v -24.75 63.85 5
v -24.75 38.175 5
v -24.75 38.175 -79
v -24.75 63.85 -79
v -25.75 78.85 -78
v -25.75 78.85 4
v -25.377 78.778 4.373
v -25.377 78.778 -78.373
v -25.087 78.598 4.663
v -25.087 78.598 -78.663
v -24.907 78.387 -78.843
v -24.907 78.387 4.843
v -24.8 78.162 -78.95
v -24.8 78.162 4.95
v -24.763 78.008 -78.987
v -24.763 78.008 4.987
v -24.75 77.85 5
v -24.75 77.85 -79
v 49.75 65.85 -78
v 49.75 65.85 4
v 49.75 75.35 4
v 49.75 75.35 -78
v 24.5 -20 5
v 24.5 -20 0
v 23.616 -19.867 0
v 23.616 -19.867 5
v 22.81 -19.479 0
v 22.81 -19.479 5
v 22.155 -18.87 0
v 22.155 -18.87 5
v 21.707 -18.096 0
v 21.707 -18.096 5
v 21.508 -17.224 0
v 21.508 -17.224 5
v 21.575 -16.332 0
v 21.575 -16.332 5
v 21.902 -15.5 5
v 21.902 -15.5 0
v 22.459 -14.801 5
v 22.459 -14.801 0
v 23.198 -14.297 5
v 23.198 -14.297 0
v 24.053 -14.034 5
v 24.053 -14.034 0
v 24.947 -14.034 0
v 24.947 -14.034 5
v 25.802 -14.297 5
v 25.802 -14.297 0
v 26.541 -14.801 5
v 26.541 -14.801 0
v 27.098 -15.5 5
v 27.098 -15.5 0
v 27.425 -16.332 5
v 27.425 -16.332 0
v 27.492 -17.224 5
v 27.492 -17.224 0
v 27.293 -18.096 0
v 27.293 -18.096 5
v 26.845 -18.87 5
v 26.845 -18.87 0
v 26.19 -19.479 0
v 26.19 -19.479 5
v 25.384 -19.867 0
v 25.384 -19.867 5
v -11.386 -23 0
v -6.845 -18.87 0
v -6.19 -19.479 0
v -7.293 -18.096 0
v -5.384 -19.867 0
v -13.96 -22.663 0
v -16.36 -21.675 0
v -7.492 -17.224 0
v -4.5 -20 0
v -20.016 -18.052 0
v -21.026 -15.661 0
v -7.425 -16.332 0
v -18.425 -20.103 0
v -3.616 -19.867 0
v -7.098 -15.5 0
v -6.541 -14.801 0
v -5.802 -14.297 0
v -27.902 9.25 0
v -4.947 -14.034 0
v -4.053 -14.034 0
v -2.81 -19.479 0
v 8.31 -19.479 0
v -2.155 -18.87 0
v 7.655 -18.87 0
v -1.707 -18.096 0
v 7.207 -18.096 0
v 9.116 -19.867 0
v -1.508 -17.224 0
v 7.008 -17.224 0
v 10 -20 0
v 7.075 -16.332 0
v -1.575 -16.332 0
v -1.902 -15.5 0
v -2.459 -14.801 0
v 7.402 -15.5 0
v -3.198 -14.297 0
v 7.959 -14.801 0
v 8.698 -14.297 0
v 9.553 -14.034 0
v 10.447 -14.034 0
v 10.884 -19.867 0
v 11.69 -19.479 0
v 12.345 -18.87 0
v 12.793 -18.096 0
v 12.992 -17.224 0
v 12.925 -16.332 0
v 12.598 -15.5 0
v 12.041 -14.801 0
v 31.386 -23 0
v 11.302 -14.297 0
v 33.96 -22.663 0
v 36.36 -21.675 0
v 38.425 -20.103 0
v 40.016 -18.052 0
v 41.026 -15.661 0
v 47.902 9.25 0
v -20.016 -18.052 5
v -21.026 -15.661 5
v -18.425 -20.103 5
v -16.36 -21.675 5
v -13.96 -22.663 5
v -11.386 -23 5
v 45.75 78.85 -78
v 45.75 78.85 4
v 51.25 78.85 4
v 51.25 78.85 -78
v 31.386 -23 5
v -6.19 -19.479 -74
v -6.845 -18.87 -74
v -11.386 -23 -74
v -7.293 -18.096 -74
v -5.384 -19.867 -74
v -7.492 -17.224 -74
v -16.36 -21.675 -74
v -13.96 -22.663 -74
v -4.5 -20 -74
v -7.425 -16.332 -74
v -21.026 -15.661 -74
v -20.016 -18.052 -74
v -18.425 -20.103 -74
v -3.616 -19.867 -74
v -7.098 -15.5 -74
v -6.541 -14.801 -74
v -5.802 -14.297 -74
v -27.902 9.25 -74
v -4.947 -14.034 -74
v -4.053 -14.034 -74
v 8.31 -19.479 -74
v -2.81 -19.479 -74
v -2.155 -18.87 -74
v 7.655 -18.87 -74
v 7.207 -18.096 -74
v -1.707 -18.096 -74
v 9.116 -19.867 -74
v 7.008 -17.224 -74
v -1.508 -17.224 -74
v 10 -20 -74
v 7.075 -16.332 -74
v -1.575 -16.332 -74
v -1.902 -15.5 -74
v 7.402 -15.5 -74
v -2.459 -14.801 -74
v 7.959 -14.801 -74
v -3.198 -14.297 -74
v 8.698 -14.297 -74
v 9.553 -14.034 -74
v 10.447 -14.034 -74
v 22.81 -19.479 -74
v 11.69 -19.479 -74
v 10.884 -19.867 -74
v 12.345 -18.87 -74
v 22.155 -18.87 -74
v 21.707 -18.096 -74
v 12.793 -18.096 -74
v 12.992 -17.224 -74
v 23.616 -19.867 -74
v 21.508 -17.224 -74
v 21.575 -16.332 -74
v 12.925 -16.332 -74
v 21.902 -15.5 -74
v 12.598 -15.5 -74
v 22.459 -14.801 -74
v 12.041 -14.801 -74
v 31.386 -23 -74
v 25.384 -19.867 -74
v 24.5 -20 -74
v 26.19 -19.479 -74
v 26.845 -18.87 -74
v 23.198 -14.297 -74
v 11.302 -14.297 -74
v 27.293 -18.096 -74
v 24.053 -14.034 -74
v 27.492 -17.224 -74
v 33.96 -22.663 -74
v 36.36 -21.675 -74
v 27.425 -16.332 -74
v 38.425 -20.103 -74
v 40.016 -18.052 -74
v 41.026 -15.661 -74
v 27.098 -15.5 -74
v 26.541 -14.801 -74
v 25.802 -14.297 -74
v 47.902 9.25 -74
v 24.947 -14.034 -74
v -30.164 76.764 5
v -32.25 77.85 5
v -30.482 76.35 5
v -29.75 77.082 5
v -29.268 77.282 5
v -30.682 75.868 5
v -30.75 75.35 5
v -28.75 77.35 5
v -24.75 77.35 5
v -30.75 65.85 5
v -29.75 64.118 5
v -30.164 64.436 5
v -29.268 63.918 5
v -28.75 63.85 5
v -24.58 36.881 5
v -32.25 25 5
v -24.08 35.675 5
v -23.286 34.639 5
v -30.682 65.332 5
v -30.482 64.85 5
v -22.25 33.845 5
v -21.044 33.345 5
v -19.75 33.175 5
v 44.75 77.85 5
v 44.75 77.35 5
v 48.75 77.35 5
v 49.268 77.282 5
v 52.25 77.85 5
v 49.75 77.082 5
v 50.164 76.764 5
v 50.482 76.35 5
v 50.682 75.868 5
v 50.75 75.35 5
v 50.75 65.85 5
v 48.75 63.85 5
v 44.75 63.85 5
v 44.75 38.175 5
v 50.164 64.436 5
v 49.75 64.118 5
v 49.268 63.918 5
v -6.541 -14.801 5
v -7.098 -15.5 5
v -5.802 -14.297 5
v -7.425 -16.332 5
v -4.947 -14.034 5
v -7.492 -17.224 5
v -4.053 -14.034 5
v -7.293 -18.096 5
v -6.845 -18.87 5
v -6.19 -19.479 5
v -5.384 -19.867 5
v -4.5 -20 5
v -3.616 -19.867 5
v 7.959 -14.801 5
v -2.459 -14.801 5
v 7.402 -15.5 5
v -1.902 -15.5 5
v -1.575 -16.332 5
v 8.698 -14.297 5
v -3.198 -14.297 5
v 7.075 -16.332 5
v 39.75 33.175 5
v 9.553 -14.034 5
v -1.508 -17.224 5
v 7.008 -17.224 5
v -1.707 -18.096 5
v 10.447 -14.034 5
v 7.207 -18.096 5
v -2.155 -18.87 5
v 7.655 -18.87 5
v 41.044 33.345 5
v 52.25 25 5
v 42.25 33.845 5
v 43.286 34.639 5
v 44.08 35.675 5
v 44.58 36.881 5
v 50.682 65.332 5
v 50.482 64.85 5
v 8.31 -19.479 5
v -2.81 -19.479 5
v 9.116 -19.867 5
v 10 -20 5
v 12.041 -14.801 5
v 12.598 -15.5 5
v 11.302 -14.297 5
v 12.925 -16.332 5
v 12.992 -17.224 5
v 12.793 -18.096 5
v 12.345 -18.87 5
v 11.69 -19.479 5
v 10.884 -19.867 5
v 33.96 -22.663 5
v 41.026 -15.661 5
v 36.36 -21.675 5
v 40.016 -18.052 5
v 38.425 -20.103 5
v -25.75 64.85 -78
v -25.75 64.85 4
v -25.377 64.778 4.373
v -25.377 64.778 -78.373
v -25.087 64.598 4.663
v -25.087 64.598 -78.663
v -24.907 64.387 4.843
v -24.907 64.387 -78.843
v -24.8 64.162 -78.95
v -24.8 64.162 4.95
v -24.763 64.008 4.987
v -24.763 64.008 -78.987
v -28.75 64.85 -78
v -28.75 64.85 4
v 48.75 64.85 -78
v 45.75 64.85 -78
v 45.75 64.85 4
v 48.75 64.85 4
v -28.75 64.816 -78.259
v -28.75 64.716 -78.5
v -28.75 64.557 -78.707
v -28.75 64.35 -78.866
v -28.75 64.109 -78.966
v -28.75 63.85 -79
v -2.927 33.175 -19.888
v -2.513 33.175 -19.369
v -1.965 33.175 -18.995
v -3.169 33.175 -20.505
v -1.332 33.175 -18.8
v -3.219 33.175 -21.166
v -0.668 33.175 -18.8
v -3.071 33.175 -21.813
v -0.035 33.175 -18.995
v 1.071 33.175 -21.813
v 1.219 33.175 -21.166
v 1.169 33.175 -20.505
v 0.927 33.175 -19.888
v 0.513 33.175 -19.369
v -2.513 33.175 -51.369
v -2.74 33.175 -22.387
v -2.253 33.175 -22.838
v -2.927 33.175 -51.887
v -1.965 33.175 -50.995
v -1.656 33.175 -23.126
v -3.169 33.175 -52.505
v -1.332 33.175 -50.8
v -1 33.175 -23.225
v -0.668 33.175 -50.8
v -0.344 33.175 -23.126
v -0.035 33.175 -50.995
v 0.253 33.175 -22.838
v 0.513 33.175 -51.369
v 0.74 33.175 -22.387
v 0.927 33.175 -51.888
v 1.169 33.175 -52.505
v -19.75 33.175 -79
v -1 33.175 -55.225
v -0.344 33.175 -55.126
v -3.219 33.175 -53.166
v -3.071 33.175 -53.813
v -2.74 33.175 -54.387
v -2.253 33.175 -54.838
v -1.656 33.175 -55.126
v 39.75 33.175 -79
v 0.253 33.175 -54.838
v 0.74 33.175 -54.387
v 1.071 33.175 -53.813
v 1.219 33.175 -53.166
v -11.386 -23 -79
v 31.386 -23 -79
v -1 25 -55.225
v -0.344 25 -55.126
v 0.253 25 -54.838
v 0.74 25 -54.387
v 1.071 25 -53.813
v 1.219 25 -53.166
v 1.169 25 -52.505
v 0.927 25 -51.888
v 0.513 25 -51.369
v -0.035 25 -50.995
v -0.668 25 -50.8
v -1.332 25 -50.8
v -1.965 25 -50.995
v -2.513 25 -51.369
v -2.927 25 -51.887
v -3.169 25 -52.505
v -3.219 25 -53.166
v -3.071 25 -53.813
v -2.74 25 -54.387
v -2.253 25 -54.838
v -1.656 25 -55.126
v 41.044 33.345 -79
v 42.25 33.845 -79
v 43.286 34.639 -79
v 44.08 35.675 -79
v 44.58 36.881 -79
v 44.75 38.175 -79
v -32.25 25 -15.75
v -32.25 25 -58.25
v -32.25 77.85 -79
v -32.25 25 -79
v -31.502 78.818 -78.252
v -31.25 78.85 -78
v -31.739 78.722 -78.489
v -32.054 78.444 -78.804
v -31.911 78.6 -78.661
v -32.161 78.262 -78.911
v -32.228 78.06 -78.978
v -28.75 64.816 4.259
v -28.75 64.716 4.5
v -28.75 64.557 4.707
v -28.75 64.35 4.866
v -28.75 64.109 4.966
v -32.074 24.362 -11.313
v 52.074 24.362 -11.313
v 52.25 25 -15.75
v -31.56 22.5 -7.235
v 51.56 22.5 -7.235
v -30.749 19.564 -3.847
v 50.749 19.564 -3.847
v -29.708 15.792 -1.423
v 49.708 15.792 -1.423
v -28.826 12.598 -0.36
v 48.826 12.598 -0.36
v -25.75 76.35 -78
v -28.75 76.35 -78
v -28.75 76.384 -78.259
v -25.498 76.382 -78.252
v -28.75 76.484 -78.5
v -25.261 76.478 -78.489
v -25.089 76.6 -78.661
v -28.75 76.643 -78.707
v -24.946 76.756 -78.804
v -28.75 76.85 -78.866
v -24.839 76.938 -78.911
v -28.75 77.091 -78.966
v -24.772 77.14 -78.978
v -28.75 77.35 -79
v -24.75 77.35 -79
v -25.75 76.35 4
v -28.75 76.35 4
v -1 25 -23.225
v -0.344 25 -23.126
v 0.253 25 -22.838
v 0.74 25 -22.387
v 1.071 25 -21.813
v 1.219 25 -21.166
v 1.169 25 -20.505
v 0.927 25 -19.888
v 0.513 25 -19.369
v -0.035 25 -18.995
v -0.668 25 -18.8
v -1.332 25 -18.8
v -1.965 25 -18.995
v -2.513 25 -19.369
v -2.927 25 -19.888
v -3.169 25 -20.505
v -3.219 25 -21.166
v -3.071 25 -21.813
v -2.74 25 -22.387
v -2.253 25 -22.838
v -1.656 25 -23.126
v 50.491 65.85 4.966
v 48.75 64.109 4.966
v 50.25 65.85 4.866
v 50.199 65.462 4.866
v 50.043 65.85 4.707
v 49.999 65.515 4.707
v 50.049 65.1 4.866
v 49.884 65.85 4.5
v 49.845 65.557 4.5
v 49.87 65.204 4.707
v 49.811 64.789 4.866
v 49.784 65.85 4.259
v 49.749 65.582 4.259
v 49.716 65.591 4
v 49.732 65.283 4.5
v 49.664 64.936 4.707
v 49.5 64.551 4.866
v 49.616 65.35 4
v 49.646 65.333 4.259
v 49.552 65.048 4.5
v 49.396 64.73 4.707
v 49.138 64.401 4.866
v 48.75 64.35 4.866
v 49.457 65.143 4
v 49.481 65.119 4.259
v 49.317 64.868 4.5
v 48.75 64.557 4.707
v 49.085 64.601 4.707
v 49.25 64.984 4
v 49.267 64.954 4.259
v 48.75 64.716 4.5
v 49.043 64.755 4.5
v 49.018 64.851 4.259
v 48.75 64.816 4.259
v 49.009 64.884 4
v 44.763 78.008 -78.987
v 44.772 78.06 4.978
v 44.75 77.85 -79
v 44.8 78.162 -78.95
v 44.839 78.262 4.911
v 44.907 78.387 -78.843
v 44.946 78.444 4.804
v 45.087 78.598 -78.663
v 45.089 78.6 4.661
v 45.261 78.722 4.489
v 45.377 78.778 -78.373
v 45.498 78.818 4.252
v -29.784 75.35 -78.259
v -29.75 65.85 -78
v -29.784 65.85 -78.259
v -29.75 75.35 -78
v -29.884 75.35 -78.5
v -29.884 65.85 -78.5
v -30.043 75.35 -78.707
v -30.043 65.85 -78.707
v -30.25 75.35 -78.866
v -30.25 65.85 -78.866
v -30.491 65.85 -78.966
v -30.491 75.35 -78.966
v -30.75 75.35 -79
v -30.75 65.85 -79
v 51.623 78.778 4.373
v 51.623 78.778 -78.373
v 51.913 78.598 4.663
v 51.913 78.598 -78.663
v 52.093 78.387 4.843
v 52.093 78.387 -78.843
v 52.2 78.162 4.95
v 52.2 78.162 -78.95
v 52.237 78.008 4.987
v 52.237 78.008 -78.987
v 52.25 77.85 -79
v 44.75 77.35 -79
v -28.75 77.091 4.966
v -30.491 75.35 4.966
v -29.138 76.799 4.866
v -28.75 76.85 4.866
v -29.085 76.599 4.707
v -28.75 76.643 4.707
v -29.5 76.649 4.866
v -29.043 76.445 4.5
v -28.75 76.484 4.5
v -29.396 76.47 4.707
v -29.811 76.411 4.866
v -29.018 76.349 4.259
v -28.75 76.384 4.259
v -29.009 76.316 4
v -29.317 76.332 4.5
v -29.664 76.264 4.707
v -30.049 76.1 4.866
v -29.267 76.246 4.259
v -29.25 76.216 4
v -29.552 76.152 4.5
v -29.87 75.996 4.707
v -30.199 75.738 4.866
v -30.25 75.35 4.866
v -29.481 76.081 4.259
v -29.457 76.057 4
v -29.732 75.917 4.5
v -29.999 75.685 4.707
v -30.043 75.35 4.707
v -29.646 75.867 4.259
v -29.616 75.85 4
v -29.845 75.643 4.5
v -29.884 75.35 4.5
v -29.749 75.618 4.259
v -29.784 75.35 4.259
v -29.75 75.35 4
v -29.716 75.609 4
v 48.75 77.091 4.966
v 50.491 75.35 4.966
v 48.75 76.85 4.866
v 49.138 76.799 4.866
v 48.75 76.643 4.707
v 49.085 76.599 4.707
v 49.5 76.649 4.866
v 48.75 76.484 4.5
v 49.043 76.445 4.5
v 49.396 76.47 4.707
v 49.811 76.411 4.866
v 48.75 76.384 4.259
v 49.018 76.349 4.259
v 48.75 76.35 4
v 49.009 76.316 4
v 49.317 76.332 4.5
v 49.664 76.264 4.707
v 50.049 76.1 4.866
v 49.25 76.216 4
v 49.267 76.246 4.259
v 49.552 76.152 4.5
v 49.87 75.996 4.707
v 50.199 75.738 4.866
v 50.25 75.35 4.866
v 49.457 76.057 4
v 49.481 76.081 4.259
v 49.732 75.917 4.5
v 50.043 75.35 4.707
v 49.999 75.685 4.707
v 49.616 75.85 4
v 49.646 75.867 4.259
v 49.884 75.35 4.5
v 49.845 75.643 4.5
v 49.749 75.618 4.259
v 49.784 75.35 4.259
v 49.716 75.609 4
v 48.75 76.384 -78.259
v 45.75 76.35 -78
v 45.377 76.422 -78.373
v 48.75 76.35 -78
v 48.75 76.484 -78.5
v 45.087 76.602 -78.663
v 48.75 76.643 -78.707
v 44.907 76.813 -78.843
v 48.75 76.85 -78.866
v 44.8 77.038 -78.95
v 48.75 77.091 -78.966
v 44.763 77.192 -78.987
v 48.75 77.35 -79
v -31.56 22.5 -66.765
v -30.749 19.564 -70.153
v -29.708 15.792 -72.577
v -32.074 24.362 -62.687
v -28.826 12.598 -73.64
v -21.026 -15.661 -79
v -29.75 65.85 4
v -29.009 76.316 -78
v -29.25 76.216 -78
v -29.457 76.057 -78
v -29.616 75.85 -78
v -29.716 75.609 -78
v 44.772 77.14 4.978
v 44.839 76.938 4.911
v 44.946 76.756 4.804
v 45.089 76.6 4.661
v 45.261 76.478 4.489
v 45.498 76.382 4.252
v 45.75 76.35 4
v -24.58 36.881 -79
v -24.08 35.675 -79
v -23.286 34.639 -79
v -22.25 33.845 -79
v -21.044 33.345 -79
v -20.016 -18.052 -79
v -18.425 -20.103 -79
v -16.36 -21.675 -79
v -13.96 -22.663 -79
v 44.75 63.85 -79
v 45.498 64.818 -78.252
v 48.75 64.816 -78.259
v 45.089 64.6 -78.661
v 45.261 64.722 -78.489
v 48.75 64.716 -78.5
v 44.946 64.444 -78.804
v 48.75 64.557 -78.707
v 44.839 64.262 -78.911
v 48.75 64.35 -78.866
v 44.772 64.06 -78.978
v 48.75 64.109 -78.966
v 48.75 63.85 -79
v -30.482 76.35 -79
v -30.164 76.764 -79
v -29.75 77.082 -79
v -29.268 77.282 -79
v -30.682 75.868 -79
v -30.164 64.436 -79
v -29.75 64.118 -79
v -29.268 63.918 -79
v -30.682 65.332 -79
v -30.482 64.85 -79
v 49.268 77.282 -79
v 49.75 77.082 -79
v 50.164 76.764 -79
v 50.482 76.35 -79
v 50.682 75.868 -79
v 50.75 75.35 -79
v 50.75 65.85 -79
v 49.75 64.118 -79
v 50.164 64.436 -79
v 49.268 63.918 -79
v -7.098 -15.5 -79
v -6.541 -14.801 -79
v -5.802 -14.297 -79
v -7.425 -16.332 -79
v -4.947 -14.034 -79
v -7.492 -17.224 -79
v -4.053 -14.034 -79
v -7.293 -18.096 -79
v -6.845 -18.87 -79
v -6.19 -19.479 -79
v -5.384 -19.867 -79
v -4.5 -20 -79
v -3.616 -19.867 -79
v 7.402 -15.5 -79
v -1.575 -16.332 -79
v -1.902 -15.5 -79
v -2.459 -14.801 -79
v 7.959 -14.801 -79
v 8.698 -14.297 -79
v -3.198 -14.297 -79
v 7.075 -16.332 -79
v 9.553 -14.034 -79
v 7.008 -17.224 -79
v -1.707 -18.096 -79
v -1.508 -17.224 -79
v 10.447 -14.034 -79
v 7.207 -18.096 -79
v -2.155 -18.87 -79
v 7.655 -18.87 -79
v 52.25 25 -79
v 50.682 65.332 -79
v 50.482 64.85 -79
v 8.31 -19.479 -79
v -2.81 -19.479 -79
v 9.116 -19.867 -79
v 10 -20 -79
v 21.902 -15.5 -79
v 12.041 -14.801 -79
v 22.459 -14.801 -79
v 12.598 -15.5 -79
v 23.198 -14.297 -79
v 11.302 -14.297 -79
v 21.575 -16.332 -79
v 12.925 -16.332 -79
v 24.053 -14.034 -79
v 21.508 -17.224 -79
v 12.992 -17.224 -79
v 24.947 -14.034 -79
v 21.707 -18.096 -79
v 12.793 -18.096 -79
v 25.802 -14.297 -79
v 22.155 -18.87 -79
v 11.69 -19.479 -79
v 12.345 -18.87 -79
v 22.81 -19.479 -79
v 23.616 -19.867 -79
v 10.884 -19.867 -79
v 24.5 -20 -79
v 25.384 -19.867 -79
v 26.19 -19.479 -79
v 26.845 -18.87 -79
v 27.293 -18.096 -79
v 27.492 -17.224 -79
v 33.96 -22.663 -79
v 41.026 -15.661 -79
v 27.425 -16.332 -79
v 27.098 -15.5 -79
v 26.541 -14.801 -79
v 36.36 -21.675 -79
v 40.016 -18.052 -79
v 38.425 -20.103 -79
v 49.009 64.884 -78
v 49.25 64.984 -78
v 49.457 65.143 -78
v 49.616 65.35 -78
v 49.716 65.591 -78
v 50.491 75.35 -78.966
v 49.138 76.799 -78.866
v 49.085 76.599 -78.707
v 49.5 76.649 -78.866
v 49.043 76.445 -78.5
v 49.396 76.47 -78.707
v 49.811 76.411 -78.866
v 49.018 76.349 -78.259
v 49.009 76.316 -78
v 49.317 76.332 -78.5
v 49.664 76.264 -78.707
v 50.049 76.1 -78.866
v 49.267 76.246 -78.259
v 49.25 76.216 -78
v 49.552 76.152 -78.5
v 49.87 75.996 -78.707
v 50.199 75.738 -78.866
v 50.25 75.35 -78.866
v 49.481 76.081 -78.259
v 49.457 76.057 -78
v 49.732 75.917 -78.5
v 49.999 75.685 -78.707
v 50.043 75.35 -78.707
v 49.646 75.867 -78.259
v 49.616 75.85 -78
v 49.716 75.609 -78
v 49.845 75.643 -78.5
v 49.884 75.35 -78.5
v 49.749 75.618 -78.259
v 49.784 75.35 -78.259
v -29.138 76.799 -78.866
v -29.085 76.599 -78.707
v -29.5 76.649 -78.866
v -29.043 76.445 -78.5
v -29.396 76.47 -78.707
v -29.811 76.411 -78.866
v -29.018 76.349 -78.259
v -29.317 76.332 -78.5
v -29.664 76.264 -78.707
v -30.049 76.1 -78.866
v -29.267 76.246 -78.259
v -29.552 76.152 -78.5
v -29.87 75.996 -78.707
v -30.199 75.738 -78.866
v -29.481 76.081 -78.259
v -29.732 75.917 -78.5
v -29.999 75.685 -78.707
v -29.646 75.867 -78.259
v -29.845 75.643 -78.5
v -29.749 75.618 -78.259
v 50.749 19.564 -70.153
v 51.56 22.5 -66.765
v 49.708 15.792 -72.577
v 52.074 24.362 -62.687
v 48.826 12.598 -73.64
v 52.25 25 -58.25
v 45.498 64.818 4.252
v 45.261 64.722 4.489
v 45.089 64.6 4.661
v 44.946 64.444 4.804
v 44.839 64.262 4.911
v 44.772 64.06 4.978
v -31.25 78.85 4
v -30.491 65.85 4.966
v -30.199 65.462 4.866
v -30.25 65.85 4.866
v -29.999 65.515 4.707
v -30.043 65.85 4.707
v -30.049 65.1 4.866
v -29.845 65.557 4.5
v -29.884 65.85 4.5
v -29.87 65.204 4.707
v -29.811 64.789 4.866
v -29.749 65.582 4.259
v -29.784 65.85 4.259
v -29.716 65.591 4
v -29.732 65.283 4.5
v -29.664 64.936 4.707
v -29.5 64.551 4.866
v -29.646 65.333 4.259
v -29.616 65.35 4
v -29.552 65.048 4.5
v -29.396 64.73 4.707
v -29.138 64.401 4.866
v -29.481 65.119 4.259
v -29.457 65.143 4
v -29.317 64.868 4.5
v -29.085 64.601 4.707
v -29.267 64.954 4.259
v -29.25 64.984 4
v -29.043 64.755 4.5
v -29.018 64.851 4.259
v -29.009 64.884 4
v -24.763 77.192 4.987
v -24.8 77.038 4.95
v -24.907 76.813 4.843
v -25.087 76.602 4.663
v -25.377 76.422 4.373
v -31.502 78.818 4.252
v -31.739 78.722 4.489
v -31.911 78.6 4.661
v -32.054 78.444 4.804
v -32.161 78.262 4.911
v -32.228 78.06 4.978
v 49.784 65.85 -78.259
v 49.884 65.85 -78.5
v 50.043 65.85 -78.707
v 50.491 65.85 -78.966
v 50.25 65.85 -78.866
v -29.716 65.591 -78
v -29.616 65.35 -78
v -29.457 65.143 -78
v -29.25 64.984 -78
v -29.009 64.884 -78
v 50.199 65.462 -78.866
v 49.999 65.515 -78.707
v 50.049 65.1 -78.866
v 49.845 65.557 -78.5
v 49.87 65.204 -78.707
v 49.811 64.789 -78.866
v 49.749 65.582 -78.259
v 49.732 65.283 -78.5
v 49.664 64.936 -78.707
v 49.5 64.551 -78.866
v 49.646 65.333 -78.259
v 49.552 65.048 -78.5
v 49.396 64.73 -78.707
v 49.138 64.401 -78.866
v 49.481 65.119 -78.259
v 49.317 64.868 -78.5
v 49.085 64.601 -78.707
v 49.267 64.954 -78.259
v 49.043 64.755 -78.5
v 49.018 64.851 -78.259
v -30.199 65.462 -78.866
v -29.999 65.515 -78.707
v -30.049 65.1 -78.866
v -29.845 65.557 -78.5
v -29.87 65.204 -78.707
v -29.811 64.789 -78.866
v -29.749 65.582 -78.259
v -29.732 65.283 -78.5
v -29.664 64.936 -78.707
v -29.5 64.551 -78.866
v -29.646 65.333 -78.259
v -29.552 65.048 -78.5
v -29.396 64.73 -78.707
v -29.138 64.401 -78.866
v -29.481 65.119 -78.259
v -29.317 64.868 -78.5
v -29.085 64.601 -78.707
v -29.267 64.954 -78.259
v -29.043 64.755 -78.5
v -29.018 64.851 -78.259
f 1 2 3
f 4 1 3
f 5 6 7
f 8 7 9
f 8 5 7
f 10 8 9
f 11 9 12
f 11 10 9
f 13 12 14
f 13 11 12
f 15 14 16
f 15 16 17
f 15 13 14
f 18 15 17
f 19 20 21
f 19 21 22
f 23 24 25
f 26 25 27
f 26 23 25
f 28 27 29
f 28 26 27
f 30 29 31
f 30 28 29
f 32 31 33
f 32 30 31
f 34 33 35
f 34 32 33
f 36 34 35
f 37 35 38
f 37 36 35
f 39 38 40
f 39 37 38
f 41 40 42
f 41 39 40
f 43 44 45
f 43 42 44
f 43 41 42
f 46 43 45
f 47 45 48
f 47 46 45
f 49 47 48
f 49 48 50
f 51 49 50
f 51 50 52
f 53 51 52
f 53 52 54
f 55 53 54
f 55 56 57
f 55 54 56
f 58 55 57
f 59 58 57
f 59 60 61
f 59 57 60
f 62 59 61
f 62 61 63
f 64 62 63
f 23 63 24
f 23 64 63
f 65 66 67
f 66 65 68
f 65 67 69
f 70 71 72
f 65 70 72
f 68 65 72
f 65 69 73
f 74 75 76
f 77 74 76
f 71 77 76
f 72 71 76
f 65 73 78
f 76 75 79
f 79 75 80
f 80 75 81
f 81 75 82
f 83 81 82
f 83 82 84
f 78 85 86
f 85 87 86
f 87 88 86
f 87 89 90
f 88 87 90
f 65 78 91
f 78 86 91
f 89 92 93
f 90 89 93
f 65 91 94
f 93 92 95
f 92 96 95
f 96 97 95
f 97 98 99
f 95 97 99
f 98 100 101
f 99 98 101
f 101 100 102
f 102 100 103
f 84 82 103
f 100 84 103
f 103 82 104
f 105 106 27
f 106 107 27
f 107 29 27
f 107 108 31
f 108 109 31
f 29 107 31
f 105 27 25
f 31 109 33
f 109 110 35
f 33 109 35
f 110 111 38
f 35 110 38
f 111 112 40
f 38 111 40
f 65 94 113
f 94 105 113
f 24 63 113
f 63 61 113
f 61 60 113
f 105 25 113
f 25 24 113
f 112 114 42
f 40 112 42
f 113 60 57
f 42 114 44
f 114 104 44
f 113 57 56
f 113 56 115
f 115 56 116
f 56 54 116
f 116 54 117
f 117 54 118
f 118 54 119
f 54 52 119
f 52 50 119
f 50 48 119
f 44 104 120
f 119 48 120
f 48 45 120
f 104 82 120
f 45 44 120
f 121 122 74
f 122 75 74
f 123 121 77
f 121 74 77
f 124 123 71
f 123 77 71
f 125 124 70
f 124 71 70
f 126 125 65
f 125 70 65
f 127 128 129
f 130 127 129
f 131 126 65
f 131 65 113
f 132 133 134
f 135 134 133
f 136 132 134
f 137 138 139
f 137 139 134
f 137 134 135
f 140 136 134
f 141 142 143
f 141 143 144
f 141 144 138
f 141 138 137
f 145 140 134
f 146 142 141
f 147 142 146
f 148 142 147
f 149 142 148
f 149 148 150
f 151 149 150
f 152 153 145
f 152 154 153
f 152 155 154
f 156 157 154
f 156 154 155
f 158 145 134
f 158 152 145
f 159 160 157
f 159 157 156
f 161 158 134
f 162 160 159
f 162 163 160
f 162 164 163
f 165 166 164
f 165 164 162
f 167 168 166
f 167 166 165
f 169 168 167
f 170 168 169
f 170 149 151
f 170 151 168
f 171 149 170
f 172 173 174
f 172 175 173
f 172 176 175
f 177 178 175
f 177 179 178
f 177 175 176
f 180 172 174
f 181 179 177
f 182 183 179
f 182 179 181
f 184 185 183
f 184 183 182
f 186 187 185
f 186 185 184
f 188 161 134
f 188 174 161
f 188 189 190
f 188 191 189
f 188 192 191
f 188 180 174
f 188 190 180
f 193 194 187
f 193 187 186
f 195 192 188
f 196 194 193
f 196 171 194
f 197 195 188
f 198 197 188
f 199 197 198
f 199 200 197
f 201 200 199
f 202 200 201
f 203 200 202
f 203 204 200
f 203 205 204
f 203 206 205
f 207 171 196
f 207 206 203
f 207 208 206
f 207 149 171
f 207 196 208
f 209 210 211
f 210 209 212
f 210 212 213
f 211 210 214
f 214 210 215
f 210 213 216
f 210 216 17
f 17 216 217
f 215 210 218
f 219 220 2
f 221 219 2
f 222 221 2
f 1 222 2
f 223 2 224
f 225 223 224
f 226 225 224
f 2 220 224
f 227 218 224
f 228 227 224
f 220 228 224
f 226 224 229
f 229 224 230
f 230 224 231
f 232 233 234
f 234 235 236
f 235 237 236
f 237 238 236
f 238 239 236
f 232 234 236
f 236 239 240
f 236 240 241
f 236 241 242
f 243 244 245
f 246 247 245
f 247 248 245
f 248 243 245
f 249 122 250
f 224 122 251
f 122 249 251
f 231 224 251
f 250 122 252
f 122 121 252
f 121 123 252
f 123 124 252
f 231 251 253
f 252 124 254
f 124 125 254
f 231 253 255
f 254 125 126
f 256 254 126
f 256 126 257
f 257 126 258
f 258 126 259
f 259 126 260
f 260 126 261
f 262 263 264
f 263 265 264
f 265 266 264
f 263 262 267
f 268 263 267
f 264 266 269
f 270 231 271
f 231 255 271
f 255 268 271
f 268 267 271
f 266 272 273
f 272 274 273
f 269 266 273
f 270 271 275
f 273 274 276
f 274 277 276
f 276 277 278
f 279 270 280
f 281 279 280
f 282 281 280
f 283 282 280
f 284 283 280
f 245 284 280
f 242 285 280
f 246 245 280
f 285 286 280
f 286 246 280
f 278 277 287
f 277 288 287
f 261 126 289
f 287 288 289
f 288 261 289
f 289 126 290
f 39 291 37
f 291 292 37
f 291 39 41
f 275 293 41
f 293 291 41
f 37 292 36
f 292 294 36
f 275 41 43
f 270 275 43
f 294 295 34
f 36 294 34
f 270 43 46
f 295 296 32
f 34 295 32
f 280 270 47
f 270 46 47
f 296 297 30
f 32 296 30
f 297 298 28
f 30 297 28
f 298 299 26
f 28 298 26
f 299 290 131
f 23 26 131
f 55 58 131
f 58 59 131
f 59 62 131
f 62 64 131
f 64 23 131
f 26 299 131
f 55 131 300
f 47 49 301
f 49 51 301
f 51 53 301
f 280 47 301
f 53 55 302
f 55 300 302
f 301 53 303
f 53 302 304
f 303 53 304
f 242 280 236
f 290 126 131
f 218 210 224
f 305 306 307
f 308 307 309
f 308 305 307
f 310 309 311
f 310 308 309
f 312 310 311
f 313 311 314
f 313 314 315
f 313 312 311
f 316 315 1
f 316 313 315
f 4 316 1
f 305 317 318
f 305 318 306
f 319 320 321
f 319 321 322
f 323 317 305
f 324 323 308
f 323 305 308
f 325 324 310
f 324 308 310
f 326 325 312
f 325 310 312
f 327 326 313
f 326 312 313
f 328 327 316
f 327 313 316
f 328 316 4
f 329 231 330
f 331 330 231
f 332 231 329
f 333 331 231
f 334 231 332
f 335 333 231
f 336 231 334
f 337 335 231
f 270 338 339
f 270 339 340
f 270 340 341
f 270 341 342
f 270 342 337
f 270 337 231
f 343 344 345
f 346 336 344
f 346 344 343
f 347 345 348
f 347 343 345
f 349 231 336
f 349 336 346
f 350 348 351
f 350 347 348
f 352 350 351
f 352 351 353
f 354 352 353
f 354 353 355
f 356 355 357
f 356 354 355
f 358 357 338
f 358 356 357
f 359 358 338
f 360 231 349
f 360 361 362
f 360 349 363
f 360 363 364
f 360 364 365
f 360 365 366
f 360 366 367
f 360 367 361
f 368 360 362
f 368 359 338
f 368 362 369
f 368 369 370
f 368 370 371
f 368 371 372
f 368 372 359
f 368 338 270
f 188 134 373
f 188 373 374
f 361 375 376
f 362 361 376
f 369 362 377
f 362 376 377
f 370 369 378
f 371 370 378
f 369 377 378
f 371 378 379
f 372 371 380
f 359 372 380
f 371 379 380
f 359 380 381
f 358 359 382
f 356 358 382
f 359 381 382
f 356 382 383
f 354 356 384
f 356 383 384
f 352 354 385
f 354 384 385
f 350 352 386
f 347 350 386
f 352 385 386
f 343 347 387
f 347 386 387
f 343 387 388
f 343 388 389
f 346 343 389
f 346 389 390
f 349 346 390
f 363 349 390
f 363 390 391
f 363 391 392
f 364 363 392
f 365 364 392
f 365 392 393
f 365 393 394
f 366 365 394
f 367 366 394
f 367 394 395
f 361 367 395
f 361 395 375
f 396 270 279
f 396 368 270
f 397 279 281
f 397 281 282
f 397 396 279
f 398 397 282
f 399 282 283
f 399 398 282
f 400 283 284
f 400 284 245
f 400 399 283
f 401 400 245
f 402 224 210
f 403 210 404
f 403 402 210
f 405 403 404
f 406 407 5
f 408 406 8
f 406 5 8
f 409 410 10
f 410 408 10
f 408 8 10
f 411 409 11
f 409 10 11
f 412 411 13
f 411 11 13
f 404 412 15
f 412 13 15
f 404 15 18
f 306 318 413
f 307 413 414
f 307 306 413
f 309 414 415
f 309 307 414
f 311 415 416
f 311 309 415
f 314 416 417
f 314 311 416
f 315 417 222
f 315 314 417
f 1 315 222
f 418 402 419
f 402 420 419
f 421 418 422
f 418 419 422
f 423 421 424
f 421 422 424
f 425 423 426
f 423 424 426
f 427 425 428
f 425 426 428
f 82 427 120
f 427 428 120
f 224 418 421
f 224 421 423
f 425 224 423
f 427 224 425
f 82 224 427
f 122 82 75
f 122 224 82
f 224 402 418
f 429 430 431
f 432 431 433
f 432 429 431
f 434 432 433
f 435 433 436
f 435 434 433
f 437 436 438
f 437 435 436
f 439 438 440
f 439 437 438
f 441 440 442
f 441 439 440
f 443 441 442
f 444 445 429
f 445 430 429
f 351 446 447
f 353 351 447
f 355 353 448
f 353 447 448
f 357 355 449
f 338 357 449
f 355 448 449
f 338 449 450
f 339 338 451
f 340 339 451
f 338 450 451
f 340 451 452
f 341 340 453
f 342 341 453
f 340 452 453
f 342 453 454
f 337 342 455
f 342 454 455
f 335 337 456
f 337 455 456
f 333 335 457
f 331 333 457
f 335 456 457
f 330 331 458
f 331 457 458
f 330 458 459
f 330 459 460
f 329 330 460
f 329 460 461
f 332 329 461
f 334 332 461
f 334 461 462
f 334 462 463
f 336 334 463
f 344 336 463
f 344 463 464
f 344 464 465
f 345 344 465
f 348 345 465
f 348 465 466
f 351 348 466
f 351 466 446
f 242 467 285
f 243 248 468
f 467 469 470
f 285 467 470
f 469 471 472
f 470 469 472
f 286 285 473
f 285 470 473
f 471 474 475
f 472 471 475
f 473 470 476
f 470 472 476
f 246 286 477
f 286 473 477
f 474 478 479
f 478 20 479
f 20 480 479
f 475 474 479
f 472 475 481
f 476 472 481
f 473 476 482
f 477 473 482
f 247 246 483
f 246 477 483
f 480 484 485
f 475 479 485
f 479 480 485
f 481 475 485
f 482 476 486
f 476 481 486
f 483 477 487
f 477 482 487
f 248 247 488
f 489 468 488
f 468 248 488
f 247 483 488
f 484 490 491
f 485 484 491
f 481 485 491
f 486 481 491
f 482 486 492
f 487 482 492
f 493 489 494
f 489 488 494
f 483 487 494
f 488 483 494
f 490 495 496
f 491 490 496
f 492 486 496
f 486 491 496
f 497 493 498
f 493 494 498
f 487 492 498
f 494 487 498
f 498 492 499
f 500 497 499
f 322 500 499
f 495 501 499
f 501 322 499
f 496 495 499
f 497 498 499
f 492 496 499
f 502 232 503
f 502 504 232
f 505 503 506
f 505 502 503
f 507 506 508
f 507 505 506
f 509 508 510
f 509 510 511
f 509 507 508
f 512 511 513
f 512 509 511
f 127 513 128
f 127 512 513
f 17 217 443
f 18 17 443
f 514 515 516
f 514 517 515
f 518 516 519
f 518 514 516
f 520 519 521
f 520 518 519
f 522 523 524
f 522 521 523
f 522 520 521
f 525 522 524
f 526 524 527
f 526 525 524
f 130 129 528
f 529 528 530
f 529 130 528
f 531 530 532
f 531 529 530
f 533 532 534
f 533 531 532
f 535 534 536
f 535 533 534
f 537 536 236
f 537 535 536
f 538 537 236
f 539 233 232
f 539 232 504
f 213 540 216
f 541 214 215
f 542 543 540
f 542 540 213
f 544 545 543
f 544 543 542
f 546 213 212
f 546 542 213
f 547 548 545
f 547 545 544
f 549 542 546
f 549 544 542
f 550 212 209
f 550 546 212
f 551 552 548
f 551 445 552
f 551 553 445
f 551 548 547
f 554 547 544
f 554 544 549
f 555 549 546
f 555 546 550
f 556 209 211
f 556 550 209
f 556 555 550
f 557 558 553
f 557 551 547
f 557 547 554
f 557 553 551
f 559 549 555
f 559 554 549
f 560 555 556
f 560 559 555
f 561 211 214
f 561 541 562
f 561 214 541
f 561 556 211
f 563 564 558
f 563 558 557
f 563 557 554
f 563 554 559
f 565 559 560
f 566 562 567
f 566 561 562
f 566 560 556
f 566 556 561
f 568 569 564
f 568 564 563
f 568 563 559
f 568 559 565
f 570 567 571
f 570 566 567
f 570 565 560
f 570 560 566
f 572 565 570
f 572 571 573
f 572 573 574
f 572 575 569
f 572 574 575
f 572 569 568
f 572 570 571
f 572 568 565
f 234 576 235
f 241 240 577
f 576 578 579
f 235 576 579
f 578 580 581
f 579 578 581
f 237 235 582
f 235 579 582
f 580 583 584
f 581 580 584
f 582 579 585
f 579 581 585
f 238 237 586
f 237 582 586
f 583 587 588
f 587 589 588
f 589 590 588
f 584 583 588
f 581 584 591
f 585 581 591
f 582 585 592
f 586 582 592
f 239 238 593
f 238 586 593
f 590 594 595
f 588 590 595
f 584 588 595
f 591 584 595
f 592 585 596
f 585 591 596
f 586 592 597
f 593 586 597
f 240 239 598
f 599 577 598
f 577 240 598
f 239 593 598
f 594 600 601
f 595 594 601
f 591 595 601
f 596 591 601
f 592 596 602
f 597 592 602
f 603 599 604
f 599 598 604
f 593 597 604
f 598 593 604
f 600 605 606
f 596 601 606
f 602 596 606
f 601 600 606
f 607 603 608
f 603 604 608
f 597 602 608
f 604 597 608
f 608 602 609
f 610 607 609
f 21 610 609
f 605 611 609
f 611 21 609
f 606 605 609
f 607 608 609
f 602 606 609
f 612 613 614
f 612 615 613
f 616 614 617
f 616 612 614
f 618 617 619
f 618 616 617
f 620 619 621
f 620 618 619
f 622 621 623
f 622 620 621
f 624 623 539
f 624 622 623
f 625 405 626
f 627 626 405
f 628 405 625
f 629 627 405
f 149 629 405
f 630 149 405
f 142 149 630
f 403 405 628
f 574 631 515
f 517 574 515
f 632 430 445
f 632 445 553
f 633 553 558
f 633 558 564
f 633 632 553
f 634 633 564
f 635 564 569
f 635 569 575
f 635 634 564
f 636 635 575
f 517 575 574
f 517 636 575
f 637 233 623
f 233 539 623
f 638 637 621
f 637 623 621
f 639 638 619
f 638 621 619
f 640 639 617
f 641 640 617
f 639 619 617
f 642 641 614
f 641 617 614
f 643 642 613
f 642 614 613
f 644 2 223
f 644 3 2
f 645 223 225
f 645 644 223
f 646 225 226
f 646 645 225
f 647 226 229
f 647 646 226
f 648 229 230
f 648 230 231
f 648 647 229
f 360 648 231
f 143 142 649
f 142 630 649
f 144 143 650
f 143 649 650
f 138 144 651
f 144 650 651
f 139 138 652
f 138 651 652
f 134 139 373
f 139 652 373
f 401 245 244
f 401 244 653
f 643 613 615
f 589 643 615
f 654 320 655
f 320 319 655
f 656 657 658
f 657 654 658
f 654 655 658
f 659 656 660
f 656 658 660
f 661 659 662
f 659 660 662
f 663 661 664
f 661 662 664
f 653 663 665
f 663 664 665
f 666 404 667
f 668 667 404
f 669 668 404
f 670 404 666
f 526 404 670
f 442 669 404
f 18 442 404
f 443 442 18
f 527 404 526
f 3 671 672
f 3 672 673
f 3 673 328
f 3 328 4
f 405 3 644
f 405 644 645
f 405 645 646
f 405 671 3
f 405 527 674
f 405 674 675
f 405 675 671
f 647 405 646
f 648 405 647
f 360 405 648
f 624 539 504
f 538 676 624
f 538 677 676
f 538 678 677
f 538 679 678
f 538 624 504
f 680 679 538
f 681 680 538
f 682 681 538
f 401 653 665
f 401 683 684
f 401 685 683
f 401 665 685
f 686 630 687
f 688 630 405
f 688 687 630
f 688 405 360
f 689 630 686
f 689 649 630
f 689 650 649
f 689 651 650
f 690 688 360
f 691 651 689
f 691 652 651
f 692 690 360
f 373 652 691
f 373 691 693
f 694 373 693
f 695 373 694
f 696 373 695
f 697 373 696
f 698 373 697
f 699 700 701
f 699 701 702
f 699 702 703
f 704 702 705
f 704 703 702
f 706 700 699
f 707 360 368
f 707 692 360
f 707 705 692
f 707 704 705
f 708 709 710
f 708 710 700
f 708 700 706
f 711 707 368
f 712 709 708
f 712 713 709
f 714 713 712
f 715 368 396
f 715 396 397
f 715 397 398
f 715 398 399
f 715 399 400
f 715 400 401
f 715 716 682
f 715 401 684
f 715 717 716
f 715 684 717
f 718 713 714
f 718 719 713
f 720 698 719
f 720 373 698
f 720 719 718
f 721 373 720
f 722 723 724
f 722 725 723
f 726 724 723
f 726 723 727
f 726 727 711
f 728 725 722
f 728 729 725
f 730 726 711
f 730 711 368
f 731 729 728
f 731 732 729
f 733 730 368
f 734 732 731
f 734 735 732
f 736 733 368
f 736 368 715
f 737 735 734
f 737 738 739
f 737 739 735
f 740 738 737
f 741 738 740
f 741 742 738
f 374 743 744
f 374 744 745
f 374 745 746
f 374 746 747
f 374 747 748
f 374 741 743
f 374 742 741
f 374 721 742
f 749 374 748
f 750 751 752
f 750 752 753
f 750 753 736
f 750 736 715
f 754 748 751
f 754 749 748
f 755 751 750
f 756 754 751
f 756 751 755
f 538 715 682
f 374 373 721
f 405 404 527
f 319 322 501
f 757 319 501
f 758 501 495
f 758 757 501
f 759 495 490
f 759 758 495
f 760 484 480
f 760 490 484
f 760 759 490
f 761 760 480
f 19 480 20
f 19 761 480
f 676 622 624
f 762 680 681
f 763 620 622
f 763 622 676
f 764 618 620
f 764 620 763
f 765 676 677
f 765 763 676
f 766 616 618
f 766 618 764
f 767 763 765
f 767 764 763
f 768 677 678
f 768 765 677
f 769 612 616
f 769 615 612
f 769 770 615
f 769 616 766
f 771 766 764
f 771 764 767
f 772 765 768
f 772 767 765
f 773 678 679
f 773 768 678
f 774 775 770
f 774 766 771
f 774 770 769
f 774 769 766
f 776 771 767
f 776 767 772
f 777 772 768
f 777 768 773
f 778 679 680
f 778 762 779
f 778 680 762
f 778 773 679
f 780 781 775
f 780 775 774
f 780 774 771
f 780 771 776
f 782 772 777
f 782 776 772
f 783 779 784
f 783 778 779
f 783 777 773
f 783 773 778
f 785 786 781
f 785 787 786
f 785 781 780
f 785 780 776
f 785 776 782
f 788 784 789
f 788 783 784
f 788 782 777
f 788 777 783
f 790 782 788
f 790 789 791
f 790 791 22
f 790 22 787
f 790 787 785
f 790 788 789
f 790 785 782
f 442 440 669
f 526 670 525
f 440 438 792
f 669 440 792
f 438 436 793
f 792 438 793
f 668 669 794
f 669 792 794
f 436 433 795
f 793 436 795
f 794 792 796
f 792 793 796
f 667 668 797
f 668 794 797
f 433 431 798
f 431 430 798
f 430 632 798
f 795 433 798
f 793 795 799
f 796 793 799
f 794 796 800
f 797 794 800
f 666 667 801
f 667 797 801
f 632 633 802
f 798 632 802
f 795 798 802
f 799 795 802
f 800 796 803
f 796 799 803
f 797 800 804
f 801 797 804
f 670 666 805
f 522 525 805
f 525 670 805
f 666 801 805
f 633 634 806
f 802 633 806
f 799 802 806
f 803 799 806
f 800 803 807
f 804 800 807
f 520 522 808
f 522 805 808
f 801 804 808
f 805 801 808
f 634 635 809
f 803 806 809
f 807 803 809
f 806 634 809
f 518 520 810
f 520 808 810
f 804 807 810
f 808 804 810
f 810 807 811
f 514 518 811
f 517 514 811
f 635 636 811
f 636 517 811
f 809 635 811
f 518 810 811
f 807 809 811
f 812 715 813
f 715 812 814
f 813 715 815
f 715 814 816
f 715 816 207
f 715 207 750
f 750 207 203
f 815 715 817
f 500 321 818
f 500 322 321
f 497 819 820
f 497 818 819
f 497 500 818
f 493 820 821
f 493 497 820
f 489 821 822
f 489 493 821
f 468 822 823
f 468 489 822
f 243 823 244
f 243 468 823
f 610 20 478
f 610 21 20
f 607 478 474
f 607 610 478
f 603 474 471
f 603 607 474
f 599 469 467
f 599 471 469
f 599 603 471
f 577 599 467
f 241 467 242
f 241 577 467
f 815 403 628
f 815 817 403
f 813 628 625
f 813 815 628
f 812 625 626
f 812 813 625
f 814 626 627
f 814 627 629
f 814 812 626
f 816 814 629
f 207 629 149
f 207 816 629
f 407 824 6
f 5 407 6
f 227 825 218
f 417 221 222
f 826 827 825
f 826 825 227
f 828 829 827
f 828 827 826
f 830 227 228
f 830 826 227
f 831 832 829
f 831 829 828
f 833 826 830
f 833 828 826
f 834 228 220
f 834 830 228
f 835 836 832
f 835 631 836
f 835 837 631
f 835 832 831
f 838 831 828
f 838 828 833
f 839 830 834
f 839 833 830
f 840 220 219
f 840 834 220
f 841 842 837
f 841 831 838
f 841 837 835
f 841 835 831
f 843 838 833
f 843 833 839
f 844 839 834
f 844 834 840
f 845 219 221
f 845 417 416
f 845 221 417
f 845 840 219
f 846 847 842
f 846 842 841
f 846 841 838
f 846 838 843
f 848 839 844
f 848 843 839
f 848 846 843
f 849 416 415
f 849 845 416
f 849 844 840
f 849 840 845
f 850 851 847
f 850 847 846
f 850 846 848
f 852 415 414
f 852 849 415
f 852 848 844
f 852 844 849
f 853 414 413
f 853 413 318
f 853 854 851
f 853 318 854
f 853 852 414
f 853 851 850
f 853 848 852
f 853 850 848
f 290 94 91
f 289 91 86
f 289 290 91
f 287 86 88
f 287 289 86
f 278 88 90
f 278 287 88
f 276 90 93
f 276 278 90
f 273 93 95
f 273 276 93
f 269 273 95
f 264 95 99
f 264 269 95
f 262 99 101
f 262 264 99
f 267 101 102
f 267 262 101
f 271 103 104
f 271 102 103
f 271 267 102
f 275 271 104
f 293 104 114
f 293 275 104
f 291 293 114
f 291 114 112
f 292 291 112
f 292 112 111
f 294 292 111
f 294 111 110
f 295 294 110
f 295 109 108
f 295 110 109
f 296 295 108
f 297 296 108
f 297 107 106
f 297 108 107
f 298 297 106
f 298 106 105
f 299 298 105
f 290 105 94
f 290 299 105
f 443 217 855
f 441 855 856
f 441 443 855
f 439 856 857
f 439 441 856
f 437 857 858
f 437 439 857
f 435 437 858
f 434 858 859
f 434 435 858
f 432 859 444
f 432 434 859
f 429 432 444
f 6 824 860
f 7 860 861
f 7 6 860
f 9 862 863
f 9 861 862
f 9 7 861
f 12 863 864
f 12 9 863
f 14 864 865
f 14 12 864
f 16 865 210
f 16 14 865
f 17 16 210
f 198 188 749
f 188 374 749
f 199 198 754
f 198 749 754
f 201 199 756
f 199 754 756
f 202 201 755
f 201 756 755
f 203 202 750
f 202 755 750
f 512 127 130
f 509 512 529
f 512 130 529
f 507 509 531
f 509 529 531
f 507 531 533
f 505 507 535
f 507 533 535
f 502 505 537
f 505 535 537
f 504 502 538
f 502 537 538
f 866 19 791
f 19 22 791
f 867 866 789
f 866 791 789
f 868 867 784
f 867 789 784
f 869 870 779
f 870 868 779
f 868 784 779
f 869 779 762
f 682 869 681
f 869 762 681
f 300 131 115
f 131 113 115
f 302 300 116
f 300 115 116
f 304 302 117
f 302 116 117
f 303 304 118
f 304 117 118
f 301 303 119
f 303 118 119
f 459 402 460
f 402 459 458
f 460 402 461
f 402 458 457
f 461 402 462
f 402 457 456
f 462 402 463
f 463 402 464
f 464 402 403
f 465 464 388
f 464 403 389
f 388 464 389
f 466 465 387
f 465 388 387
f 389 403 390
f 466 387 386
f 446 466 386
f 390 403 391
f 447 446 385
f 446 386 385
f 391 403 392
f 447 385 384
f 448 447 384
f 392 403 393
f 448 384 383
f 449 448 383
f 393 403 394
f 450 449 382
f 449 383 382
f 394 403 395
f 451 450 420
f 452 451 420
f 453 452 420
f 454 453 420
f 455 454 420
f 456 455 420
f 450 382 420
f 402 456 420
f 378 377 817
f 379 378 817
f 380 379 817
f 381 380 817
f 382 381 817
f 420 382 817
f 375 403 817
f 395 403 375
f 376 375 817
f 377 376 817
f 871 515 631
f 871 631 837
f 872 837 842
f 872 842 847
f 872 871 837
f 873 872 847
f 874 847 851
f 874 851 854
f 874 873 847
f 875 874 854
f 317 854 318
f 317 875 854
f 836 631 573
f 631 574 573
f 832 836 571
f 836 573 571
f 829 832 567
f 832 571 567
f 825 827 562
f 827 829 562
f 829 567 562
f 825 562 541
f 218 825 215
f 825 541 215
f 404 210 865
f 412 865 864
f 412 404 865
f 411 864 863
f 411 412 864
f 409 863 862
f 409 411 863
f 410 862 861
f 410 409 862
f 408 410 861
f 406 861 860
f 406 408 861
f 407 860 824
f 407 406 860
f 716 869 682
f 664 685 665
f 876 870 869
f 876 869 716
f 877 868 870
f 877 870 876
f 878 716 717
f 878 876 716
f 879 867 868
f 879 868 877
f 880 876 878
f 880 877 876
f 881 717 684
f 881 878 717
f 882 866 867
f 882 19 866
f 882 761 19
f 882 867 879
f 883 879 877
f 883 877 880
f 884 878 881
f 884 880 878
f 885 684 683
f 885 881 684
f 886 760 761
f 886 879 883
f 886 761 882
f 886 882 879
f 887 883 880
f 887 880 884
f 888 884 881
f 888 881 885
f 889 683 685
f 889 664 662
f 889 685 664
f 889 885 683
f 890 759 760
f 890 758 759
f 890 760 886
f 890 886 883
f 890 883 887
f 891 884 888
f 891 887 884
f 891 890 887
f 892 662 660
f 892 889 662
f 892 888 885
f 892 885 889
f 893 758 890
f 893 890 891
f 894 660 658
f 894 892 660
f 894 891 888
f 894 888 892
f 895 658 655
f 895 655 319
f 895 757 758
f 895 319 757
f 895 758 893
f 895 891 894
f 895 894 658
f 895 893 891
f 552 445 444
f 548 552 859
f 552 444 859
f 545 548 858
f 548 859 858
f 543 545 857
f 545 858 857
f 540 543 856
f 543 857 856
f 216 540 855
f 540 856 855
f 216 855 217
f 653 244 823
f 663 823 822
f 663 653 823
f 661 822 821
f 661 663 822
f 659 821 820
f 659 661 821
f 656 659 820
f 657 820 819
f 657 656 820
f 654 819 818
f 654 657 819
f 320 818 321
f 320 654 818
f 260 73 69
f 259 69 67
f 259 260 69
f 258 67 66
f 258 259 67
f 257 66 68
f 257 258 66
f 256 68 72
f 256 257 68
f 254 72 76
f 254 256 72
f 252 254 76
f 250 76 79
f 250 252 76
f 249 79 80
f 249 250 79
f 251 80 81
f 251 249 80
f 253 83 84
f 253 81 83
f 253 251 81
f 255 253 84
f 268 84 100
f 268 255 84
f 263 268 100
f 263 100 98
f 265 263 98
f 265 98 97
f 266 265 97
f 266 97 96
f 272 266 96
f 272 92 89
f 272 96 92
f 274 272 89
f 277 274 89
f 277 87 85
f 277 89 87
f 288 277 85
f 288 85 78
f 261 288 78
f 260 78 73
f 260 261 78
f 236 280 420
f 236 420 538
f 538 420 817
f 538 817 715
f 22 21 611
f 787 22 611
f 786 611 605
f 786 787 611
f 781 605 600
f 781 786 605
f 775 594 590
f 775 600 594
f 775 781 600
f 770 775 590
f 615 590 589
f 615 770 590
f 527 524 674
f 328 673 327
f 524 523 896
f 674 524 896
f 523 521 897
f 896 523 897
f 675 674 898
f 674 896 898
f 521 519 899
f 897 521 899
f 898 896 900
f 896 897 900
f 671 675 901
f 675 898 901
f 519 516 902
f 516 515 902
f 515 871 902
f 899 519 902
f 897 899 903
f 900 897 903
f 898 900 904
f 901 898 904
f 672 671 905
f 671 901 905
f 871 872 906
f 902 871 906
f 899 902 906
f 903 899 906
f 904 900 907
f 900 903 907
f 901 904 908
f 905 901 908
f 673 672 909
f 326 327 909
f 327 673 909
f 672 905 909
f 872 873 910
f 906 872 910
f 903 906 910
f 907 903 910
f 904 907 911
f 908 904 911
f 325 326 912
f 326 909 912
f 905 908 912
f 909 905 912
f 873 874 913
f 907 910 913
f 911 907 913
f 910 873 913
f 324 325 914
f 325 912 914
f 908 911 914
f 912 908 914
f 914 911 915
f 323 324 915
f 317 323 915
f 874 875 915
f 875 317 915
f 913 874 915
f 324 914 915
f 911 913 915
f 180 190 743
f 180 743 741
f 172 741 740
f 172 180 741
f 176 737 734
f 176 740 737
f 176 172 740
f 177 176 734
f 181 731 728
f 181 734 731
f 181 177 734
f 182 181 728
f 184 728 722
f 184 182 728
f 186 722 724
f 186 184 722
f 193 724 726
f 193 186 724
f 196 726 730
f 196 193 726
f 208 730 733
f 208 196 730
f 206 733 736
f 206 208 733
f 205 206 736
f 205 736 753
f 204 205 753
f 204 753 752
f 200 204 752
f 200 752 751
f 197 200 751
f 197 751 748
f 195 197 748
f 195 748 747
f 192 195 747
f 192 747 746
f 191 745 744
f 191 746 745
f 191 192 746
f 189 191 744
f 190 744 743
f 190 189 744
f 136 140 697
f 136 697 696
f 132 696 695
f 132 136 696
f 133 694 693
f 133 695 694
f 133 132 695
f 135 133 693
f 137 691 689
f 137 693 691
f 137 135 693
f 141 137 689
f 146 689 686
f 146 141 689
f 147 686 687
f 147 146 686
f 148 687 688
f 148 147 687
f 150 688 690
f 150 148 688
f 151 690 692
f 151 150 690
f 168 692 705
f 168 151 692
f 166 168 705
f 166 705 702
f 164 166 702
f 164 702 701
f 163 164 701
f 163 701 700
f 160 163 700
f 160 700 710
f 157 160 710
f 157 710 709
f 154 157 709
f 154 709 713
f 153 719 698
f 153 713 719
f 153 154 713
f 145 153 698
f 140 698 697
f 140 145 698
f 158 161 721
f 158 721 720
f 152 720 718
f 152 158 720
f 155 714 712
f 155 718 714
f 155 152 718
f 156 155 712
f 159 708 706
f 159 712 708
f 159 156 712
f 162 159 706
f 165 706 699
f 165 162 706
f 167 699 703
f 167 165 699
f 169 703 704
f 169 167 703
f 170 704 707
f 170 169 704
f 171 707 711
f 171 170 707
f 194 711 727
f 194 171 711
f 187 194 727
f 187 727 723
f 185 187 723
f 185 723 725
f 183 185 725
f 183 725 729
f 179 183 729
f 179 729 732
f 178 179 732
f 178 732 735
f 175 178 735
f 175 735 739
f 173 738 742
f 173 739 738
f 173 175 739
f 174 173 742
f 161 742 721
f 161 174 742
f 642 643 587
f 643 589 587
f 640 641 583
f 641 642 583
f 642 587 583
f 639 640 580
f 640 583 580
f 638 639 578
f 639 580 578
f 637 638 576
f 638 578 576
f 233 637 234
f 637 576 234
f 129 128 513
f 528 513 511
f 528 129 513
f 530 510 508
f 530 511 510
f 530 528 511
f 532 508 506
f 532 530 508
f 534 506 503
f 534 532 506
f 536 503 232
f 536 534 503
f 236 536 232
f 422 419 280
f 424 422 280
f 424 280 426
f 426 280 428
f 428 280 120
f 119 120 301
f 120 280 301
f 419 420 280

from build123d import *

# Parameters (mm, degrees)
SKETCH4_W               = 84.5
SKETCH4_H               = 84
BOSS_EXTRUDE1_DEPTH     = 8.175
SKETCH5_W               = 84.5
SKETCH5_H               = 5
BOSS_EXTRUDE2_DEPTH     = 48
SKETCH6_R               = 2.225
CUT_EXTRUDE1_DEPTH      = 48
SKETCH7_W               = 7.5
SKETCH7_H               = 84
BOSS_EXTRUDE3_DEPTH     = 31.675
SKETCH8_W               = 2.5
SKETCH8_H               = 84
BOSS_EXTRUDE4_DEPTH     = 11.5
CUT_EXTRUDE2_DEPTH      = 93
CUT_EXTRUDE2_DEPTH_BACK = 5
SKETCH9_R               = 3
SKETCH10_W              = 7.5
SKETCH10_H              = 84
BOSS_EXTRUDE5_DEPTH     = 2.5
FILLET1_R               = 1
CUT_EXTRUDE3_DEPTH      = 88
CUT_EXTRUDE3_DEPTH_BACK = 24.5
FILLET2_R               = 10
FILLET3_R               = 5
FILLET4_R               = 15.75


with BuildPart() as part:
    # Sketch4 → Boss-Extrude1 (new body)
    with BuildSketch(Plane(origin=(0, 25, 0), x_dir=(1, 0, 0), z_dir=(0, 1, 0))):
        with Locations((10, 37)):
            Rectangle(SKETCH4_W, SKETCH4_H)
    extrude(amount=BOSS_EXTRUDE1_DEPTH)

    # Sketch5 → Boss-Extrude2 (add)
    with BuildSketch(Plane.XZ.offset(-25)):
        with Locations((10, 2.5)):
            Rectangle(SKETCH5_W, SKETCH5_H)
        with Locations((10, -76.5)):
            Rectangle(SKETCH5_W, SKETCH5_H)
    extrude(amount=BOSS_EXTRUDE2_DEPTH)

    # Sketch6 → Cut-Extrude1 (cut)
    with BuildSketch(Plane.XZ.offset(-25)):
        with Locations(Location((-1, -21, 0), (0, 0, 270))):
            Circle(SKETCH6_R)
        with Locations(Location((-1, -53, 0), (0, 0, 270))):
            Circle(SKETCH6_R)
    extrude(amount=-CUT_EXTRUDE1_DEPTH, mode=Mode.SUBTRACT)

    # Sketch7 → Boss-Extrude3 (add)
    with BuildSketch(Plane(origin=(0, 33.175, 0), x_dir=(1, 0, 0), z_dir=(0, 1, 0))):
        with Locations((-28.5, 37)):
            Rectangle(SKETCH7_W, SKETCH7_H)
        with Locations((48.5, 37)):
            Rectangle(SKETCH7_W, SKETCH7_H)
    extrude(amount=BOSS_EXTRUDE3_DEPTH)

    # Sketch8 → Boss-Extrude4 (add)
    with BuildSketch(Plane(origin=(0, 64.85, 0), x_dir=(1, 0, 0), z_dir=(0, 1, 0))):
        with Locations((-31, 37)):
            Rectangle(SKETCH8_W, SKETCH8_H)
        with Locations((51, 37)):
            Rectangle(SKETCH8_W, SKETCH8_H)
    extrude(amount=BOSS_EXTRUDE4_DEPTH)

    # Sketch9 → Cut-Extrude2 (cut, two sides: drawn at the far end of the back side and taken through both)
    with BuildSketch(Plane(origin=(0, 0, 0), x_dir=(-1, 0, 0), z_dir=(0, 0, -1)).offset(-CUT_EXTRUDE2_DEPTH_BACK)):
        with Locations(Location((-10, -17, 0), (0, 0, 270))):
            Circle(SKETCH9_R)
        with Locations(Location((-24.5, -17, 0), (0, 0, 270))):
            Circle(SKETCH9_R)
        with Locations(Location((4.5, -17, 0), (0, 0, 270))):
            Circle(SKETCH9_R)
    extrude(amount=CUT_EXTRUDE2_DEPTH + CUT_EXTRUDE2_DEPTH_BACK, mode=Mode.SUBTRACT)

    # Sketch10 → Boss-Extrude5 (add)
    with BuildSketch(Plane(origin=(0, 76.35, 0), x_dir=(1, 0, 0), z_dir=(0, 1, 0))):
        with Locations((48.5, 37)):
            Rectangle(SKETCH10_W, SKETCH10_H)
        with Locations((-28.5, 37)):
            Rectangle(SKETCH10_W, SKETCH10_H)
    extrude(amount=BOSS_EXTRUDE5_DEPTH)

    # Fillet1
    fillet1_edges = [part.edges().sort_by_distance(p)[0] for p in [
        (47.25, 76.35, -79),
        (44.75, 76.35, -37),
        (47.25, 76.35, 5),
        (52.25, 78.85, -37),
        (48.5, 78.85, -79),
        (44.75, 78.85, -37),
        (48.5, 78.85, 5),
        (-27.25, 76.35, 5),
        (-24.75, 76.35, -37),
        (-27.25, 76.35, -79),
        (-32.25, 78.85, -37),
        (-28.5, 78.85, 5),
        (-24.75, 78.85, -37),
        (-28.5, 78.85, -79),
        (-24.75, 64.85, -37),
        (-27.25, 64.85, -79),
        (44.75, 64.85, -37),
        (47.25, 64.85, 5),
        (-27.25, 64.85, 5),
        (47.25, 64.85, -79),
        (-29.75, 64.85, -37),
        (-29.75, 70.6, 5),
        (-29.75, 70.6, -79),
        (-29.75, 76.35, -37),
        (49.75, 64.85, -37),
        (49.75, 70.6, -79),
        (49.75, 70.6, 5),
        (49.75, 76.35, -37),
    ]]
    fillet(fillet1_edges, radius=FILLET1_R)

    # Sketch11 → Cut-Extrude3 (cut, two sides: drawn at the far end of the back side and taken through both)
    with BuildSketch(Plane(origin=(0, 0, 0), x_dir=(-1, 0, 0), z_dir=(0, 0, -1)).offset(-CUT_EXTRUDE3_DEPTH_BACK)):
        Polygon((19, -23), (32.25, -23), (32.25, 25), align=None)
        Polygon((-39, -23), (-52.25, -23), (-52.25, 25), align=None)
    extrude(amount=CUT_EXTRUDE3_DEPTH + CUT_EXTRUDE3_DEPTH_BACK, mode=Mode.SUBTRACT)

    # Fillet2
    fillet2_edges = [part.edges().sort_by_distance(p)[0] for p in [
        (39, -23, 2.5),
        (-19, -23, 2.5),
        (-19, -23, -76.5),
        (39, -23, -76.5),
    ]]
    fillet(fillet2_edges, radius=FILLET2_R)

    # Fillet3
    fillet3_edges = [part.edges().sort_by_distance(p)[0] for p in [
        (-24.75, 33.175, -37),
        (44.75, 33.175, -37),
    ]]
    fillet(fillet3_edges, radius=FILLET3_R)

    # Fillet4
    fillet4_edges = [part.edges().sort_by_distance(p)[0] for p in [
        (10, 25, 0),
        (10, 25, -74),
    ]]
    fillet(fillet4_edges, radius=FILLET4_R)


solid = part.part
